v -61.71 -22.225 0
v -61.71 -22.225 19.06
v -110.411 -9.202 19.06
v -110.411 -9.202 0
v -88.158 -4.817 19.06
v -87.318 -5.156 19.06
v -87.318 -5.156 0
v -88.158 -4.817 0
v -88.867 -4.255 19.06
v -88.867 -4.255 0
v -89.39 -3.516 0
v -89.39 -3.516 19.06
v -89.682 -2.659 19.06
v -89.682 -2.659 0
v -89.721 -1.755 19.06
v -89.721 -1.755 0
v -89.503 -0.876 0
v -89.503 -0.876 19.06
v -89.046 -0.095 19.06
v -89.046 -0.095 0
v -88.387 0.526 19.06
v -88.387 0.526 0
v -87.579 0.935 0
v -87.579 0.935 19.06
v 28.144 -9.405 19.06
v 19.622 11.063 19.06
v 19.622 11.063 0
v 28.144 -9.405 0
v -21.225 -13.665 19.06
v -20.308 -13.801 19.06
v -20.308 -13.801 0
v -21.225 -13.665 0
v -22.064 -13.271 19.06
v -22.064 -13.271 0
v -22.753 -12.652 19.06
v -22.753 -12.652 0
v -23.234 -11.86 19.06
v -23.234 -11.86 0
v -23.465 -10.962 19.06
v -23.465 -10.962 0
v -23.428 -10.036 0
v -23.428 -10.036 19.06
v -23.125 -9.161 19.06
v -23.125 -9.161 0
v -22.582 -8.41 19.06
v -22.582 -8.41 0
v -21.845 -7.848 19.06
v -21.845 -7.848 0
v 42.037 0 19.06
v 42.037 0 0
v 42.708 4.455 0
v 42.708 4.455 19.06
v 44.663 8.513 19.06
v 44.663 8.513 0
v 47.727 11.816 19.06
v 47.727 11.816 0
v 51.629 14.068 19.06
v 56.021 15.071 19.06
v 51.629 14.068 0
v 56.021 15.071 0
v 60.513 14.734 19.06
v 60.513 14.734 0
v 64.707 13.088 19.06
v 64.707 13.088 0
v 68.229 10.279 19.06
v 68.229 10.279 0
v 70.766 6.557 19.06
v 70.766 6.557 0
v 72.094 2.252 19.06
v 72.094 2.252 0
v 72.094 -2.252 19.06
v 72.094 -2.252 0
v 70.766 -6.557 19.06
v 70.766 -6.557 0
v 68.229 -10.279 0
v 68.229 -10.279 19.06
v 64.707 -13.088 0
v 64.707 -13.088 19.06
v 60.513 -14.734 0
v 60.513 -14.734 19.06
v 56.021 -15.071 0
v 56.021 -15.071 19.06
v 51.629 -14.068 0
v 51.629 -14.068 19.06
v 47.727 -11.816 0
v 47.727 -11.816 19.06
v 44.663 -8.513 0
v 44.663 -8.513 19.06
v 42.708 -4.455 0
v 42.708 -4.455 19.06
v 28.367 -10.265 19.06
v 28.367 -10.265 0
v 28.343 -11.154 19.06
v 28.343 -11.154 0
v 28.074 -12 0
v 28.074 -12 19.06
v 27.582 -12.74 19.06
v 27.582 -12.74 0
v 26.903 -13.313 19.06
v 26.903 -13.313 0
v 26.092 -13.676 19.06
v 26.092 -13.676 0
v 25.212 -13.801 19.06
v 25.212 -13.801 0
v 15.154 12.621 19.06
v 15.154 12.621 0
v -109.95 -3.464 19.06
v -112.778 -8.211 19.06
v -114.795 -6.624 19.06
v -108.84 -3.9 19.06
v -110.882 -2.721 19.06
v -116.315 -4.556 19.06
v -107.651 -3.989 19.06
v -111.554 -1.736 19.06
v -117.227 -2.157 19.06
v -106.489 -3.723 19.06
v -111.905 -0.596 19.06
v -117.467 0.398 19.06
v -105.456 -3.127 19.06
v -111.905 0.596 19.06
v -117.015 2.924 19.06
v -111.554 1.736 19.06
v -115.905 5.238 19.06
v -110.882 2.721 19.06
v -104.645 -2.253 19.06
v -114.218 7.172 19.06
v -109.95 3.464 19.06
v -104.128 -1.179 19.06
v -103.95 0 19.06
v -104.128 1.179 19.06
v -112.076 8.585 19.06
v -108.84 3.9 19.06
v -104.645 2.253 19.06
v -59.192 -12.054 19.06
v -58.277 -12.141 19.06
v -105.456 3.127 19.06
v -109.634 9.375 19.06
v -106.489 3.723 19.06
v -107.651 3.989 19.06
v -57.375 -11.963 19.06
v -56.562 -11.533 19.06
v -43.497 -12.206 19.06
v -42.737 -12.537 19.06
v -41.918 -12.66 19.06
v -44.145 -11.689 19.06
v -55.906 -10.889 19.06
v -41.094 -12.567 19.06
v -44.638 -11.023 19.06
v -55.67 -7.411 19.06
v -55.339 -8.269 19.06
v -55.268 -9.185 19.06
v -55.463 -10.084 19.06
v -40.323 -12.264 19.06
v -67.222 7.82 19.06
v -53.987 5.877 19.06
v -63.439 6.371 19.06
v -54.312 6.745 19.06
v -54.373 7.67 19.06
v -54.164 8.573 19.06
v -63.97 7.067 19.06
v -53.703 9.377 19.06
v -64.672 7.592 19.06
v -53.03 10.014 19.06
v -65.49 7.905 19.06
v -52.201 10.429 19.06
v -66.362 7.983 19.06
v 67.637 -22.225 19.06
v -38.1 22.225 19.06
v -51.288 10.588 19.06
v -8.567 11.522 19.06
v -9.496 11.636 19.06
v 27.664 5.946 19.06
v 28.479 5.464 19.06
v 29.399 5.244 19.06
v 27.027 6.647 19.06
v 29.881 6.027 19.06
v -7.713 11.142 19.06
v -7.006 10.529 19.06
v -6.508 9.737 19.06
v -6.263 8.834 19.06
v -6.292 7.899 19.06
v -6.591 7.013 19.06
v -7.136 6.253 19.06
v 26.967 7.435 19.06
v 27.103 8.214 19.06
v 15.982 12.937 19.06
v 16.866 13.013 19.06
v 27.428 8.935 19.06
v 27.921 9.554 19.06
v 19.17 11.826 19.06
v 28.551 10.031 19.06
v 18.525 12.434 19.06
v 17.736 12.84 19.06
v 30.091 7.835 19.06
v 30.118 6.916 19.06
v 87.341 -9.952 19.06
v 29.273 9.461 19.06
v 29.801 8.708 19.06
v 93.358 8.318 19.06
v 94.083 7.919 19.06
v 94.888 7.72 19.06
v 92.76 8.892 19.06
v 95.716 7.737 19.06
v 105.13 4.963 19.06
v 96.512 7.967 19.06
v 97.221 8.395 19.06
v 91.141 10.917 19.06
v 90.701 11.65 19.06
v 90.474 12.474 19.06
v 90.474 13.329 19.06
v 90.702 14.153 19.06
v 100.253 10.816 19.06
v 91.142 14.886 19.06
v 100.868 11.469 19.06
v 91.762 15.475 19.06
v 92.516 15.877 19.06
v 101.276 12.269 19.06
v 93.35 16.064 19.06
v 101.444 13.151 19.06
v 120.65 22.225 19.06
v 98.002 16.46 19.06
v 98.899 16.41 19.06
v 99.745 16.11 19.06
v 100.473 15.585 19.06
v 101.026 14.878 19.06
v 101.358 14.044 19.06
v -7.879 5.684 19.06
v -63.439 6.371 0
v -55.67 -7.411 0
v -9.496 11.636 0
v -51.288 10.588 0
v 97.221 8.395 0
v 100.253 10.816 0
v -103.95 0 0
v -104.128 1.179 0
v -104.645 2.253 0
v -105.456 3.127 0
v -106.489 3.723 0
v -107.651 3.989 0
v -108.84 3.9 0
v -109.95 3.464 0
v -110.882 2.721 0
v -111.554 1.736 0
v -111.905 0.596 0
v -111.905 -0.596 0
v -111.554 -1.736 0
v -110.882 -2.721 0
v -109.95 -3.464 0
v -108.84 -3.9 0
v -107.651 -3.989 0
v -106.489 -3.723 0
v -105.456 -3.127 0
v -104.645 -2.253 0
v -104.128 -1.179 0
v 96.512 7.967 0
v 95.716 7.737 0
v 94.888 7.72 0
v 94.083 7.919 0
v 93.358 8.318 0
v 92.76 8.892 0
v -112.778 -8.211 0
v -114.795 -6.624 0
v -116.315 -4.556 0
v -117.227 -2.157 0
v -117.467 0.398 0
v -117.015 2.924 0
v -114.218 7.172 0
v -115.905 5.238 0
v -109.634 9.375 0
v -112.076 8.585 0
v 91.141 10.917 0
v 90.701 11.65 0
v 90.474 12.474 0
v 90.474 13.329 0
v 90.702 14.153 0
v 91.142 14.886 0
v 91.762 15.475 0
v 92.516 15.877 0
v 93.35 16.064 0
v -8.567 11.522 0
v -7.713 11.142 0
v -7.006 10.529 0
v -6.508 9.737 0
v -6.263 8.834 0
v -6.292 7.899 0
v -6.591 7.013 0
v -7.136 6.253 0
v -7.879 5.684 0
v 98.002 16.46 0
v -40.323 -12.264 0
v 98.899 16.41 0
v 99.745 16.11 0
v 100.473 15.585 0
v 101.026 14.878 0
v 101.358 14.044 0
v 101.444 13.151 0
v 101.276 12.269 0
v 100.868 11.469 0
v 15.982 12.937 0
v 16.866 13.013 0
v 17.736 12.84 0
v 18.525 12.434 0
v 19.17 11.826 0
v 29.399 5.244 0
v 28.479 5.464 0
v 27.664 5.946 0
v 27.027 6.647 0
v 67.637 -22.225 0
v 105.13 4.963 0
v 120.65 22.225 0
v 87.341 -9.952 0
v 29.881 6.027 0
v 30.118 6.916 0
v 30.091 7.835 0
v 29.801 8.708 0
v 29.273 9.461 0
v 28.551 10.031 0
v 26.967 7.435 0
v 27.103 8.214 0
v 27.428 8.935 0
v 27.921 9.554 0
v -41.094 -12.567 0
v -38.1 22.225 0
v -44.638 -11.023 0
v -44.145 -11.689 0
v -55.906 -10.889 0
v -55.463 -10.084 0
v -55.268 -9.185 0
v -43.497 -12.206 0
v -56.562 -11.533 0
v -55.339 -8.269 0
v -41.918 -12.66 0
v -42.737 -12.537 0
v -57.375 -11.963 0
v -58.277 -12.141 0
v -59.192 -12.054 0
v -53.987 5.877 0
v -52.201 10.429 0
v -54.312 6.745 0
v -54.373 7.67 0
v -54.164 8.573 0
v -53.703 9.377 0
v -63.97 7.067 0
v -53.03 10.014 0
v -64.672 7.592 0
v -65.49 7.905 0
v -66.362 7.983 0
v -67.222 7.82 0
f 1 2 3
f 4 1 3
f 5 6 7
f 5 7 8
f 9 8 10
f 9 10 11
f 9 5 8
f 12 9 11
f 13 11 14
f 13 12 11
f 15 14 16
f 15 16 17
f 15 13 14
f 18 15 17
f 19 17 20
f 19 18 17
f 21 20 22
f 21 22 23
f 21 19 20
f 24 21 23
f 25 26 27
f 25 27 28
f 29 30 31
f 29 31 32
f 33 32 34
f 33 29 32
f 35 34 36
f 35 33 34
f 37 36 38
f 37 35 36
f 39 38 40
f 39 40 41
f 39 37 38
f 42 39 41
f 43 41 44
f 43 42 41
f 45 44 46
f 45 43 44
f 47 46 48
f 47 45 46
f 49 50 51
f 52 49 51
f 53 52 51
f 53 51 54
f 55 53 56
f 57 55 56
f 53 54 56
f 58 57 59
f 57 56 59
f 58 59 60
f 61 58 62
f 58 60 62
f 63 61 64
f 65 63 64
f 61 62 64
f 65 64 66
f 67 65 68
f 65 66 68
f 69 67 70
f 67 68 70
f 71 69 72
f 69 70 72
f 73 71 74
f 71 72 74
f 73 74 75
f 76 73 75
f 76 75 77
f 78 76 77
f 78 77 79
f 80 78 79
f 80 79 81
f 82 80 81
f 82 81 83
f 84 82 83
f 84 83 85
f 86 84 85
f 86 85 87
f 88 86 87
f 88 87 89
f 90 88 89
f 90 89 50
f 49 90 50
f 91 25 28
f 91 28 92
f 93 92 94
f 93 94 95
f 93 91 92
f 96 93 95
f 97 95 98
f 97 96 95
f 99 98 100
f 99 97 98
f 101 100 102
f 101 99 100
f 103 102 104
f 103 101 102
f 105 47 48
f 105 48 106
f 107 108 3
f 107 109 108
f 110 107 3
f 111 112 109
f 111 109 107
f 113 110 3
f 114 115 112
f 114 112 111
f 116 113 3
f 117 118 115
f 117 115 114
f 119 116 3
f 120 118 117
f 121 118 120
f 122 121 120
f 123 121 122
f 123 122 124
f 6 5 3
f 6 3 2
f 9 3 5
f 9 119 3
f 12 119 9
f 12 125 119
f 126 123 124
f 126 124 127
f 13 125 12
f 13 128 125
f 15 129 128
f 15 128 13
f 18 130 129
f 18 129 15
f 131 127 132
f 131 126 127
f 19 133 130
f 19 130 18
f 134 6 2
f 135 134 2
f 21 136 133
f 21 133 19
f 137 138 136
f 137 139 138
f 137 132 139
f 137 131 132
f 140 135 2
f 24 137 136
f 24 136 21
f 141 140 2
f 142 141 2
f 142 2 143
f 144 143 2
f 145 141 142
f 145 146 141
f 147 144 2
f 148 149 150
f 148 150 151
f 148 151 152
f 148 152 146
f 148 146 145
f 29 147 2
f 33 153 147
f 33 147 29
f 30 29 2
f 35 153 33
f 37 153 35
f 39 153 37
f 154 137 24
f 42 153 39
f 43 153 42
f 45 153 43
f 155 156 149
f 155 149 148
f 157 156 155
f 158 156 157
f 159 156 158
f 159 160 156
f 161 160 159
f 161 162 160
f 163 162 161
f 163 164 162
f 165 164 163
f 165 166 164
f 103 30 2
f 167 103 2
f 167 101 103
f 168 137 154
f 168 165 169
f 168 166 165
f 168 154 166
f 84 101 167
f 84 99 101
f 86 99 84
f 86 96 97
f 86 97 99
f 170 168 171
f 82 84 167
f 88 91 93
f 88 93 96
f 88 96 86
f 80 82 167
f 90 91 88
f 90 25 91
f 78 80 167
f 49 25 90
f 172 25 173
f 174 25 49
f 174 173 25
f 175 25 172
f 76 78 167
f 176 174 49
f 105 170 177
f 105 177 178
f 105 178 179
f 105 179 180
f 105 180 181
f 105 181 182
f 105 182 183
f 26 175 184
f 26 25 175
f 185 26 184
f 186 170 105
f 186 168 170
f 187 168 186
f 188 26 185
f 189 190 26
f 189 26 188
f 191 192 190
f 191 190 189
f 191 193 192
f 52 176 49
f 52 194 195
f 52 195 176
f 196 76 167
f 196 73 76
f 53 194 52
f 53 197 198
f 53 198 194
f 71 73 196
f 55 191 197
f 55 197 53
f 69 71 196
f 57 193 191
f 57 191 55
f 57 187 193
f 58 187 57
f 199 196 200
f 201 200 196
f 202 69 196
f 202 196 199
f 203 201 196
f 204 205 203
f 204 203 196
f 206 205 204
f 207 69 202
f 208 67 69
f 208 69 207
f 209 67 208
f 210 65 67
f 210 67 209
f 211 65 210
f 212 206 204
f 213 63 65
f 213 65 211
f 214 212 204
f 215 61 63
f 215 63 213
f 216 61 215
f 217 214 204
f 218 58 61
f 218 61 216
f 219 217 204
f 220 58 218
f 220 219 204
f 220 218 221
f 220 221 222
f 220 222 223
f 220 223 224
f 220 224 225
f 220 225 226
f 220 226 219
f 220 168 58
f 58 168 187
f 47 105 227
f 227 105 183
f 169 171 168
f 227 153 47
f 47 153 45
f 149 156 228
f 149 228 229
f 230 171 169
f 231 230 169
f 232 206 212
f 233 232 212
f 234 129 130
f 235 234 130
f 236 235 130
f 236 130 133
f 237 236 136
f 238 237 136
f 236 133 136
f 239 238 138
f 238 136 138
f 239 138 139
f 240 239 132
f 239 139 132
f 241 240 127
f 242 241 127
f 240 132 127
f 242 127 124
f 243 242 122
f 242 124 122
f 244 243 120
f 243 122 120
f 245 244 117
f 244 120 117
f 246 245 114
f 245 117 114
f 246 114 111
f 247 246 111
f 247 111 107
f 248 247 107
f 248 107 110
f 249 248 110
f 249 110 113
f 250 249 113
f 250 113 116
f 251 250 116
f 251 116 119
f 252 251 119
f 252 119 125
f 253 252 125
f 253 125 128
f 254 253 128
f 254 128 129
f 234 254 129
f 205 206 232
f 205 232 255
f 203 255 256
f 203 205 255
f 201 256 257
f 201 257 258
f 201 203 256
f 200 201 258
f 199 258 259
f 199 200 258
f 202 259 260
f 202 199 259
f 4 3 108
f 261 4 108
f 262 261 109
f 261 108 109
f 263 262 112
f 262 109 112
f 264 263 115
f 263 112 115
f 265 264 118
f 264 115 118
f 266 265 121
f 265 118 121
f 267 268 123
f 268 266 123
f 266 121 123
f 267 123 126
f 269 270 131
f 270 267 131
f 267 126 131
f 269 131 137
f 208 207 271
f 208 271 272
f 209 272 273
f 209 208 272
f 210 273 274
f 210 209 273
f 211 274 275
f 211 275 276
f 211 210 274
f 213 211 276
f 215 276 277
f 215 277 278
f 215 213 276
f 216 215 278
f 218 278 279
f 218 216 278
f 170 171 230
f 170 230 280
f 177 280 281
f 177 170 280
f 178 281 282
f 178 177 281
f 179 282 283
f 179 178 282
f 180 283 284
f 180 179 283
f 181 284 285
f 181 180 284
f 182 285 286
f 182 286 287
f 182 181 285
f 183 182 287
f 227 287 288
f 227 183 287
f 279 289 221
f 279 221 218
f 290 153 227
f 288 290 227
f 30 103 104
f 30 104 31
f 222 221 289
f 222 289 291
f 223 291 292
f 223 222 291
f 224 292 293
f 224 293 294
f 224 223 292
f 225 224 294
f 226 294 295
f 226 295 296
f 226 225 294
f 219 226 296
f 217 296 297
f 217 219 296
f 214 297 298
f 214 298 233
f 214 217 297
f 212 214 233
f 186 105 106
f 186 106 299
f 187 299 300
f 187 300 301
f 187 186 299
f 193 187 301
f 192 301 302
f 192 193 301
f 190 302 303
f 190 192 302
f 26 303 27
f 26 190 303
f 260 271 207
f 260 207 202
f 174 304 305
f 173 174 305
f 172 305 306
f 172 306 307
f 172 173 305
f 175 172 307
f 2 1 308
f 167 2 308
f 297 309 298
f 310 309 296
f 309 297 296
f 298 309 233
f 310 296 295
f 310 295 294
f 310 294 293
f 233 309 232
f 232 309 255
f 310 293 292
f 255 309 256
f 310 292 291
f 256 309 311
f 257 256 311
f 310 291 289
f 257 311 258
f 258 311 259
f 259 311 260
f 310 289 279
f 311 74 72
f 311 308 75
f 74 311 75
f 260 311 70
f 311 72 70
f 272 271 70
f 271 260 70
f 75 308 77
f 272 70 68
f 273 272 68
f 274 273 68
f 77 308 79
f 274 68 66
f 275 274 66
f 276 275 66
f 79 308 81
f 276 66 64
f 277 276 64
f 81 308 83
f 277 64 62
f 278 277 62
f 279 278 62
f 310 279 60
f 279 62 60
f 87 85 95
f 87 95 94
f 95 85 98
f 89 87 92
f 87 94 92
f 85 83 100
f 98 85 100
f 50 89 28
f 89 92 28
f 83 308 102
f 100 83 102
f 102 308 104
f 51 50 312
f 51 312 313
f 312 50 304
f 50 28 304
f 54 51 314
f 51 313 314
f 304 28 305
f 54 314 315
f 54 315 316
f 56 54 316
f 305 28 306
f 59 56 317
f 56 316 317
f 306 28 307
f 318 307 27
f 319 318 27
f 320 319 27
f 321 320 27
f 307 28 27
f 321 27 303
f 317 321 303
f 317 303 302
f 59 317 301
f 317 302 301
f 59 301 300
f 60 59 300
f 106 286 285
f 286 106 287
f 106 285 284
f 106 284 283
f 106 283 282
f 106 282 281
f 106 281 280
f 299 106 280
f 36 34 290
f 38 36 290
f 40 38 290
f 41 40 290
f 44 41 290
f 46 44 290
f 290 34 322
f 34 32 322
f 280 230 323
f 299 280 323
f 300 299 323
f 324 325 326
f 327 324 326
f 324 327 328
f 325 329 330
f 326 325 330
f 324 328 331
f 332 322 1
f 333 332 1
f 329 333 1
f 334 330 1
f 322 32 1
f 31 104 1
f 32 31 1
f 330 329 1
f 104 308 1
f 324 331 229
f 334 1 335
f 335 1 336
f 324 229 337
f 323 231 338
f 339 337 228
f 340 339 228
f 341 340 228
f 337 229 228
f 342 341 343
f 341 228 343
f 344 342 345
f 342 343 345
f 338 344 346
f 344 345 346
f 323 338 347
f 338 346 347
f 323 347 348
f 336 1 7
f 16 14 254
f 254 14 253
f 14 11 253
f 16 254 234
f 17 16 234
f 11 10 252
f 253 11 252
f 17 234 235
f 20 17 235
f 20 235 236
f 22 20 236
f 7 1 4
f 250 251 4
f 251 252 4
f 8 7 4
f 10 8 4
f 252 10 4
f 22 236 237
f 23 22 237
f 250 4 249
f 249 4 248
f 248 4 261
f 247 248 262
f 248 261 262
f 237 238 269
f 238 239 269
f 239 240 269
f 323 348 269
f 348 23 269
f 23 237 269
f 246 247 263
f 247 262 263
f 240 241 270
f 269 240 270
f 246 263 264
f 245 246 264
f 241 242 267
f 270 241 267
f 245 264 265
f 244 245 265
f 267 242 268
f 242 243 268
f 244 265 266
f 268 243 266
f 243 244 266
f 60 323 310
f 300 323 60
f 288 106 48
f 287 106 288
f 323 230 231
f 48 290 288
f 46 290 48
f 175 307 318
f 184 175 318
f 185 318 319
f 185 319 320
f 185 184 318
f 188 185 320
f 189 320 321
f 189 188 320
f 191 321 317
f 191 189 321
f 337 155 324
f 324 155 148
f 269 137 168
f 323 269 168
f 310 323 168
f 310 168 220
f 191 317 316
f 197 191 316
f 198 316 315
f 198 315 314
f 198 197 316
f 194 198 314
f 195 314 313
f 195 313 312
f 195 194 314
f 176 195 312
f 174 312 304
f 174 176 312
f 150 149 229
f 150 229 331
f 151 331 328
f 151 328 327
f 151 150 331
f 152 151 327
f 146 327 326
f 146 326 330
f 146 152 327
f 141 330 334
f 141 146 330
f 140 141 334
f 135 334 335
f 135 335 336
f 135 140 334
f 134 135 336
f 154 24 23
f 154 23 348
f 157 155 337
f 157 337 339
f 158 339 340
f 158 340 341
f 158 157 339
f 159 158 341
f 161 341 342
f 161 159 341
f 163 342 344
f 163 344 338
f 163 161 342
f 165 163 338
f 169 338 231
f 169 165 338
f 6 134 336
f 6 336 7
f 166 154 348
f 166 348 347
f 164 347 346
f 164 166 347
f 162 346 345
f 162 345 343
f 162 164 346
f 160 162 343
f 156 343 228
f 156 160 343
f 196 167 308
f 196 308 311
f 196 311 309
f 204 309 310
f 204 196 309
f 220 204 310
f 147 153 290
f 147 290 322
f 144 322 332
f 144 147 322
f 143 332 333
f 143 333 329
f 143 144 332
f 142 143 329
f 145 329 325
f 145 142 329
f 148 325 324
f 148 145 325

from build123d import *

# Parameters (mm, degrees)
SKETCH1_W           = 241.3
SKETCH1_H           = 44.45
BOSS_EXTRUDE1_DEPTH = 19.06
SKETCH3_R           = 4
CUT_EXTRUDE1_DEPTH  = 125.151748779
CUT_EXTRUDE2_DEPTH  = 125.151748779
SKETCH11_R          = 15.113
CUT_EXTRUDE3_DEPTH  = 125.151748779
CUT_EXTRUDE5_DEPTH  = 125.151748779
FILLET1_R           = 3.175


with BuildPart() as part:
    # Sketch1 → Boss-Extrude1 (new body)
    with BuildSketch(Plane.XY):
        Rectangle(SKETCH1_W, SKETCH1_H)
    extrude(amount=BOSS_EXTRUDE1_DEPTH)

    # Sketch3 → Cut-Extrude1 (cut, through all)
    with BuildSketch(Plane.XY.offset(19.06)):
        with Locations((-107.95, 0)):
            Circle(SKETCH3_R)
    extrude(amount=-CUT_EXTRUDE1_DEPTH, mode=Mode.SUBTRACT)

    # Sketch5 → Cut-Extrude2 (cut, through all)
    with BuildSketch(Plane.XY.offset(19.06)):
        with BuildLine():
            ThreePointArc((67.637087091, -22.225), (96.497916739, -2.807923084), (120.65, 22.225))
            Line((120.65, 22.225), (120.65, -22.225))
            Line((120.65, -22.225), (67.637087091, -22.225))
        make_face()
        with BuildLine():
            Line((-61.710210997, -22.225), (-110.410681995, -9.201666649))
            ThreePointArc((-110.410681995, -9.201666649), (-117.466687359, 0.397852617), (-109.634072253, 9.374941368))
            Line((-109.634072253, 9.374941368), (-38.1, 22.225))
            Line((-38.1, 22.225), (-120.65, 22.225))
            Line((-120.65, 22.225), (-120.65, -22.225))
            Line((-120.65, -22.225), (-61.710210997, -22.225))
        make_face()
    extrude(amount=-CUT_EXTRUDE2_DEPTH, mode=Mode.SUBTRACT)

    # Sketch11 → Cut-Extrude3 (cut, through all)
    with BuildSketch(Plane(origin=(0, 0, 0), x_dir=(-1, 0, 0), z_dir=(0, 0, -1))):
        with Locations((-57.15, 0)):
            Circle(SKETCH11_R)
    extrude(amount=-CUT_EXTRUDE3_DEPTH, mode=Mode.SUBTRACT)

    # Sketch14 → Cut-Extrude5 (cut, through all)
    with BuildSketch(Plane.XY.offset(19.06)):
        Polygon((87.427282936, 15.558708401), (94.741989073, 6.41532573), (108.43714596, 17.350301349), align=None)
        Polygon((18.258483502, 14.338005817), (29.973493873, -13.800738505), (-32.606529101, -13.800738505), align=None)
        Polygon((-43.100879601, -13.800738505), (3.468328331, 11.961548148), (-56.519992491, 10.456326363), align=None)
        Polygon((-64.730780564, 8.662121496), (-52.068091334, -13.800738505), (-97.910045601, -2.558530136), align=None)
        Polygon((25.377220315, 10.456326363), (27.958556135, 4.256114298), (42.851089432, 10.456326363), align=None)
    extrude(amount=-CUT_EXTRUDE5_DEPTH, mode=Mode.SUBTRACT)

    # Fillet1
    # the kernel refuses this fillet: 3.175 mm, written as the material it adds along each edge
    with BuildSketch(Plane(origin=(-64.730780564, 8.662121496, 19.06), x_dir=(-0.9472961687281491, -0.32035912459764615, 0), z_dir=(0, 0, -1))) as fillet1_piece_1:
        with BuildLine():
            CenterArc((FILLET1_R * 0.828359701977, -FILLET1_R), FILLET1_R, 90, 79.273962625)
            Line((-FILLET1_R * 0.154168619156, -FILLET1_R * 0.813886867277), (0, 0))
            Line((0, 0), (FILLET1_R * 0.828359701977, 0))
        make_face()
    extrude(amount=19.06)
    with BuildSketch(Plane(origin=(-52.068091334, -13.800738505, 19.06), x_dir=(-0.9712208651423397, 0.23818066905642277, 0), z_dir=(0, 0, -1))) as fillet1_piece_2:
        with BuildLine():
            CenterArc((FILLET1_R * 2.310303232, FILLET1_R), FILLET1_R, 136.810131201, 133.189868799)
            Line((FILLET1_R * 1.58121357242, FILLET1_R * 1.68441819694), (0, 0))
            Line((0, 0), (FILLET1_R * 2.310303232, 0))
        make_face()
    extrude(amount=19.06)
    with BuildSketch(Plane(origin=(-97.910045601, -2.558530136, 19.06), x_dir=(0.9472961687281494, 0.32035912459764504, 0), z_dir=(0, 0, -1))) as fillet1_piece_3:
        with BuildLine():
            CenterArc((FILLET1_R * 3.43487976267, FILLET1_R), FILLET1_R, 122.463831423, 147.536168577)
            Line((FILLET1_R * 2.89811266126, FILLET1_R * 1.8437304539), (0, 0))
            Line((0, 0), (FILLET1_R * 3.43487976267, 0))
        make_face()
    extrude(amount=19.06)
    with BuildSketch(Plane(origin=(-56.519992491, 10.456326363, 19.06), x_dir=(0.9996853464994547, 0.025084018702456384, 0), z_dir=(0, 0, -1))) as fillet1_piece_4:
        with BuildLine():
            CenterArc((FILLET1_R * 1.64840949376, FILLET1_R), FILLET1_R, 152.485801408, 117.514198592)
            Line((FILLET1_R * 0.761513114746, FILLET1_R * 1.46196841114), (0, 0))
            Line((0, 0), (FILLET1_R * 1.64840949376, 0))
        make_face()
    extrude(amount=19.06)
    with BuildSketch(Plane(origin=(3.468328331, 11.961548148, 19.06), x_dir=(-0.8750292896969416, -0.48406997652453715, 0), z_dir=(0, 0, -1))) as fillet1_piece_5:
        with BuildLine():
            CenterArc((FILLET1_R * 4.08447056876, FILLET1_R), FILLET1_R, 117.514198592, 152.485801408)
            Line((FILLET1_R * 3.62250215761, FILLET1_R * 1.88689637901), (0, 0))
            Line((0, 0), (FILLET1_R * 4.08447056876, 0))
        make_face()
    extrude(amount=19.06)
    with BuildSketch(Plane(origin=(-43.100879601, -13.800738505, 19.06), x_dir=(0.8750292896969416, 0.48406997652453704, 0), z_dir=(0, 0, -1))) as fillet1_piece_6:
        with BuildLine():
            CenterArc((FILLET1_R, -FILLET1_R), FILLET1_R, 90, 90)
            Line((0, -FILLET1_R), (0, 0))
            Line((0, 0), (FILLET1_R, 0))
        make_face()
    extrude(amount=19.06)
    with BuildSketch(Plane(origin=(-32.606529101, -13.800738505, 19.06), x_dir=(0.8750292896969417, 0.48406997652453687, 0), z_dir=(0, 0, -1))) as fillet1_piece_7:
        with BuildLine():
            CenterArc((FILLET1_R * 3.87346743369, FILLET1_R), FILLET1_R, 118.951557757, 151.048442243)
            Line((FILLET1_R * 3.38939745717, FILLET1_R * 1.8750292897), (0, 0))
            Line((0, 0), (FILLET1_R * 3.87346743369, 0))
        make_face()
    extrude(amount=19.06)
    with BuildSketch(Plane(origin=(18.258483502, 14.338005817, 19.06), x_dir=(-0.8750292896969422, -0.4840699765245361, 0), z_dir=(0, 0, -1))) as fillet1_piece_8:
        with BuildLine():
            CenterArc((FILLET1_R * 1.11742055595, -FILLET1_R), FILLET1_R, 90, 96.348118808)
            Line((FILLET1_R * 0.123552109362, -FILLET1_R * 1.11056903214), (0, 0))
            Line((0, 0), (FILLET1_R * 1.11742055595, 0))
        make_face()
    extrude(amount=19.06)
    with BuildSketch(Plane(origin=(29.973493873, -13.800738505, 19.06), x_dir=(-1, 0, 0), z_dir=(0, 0, -1))) as fillet1_piece_9:
        with BuildLine():
            CenterArc((FILLET1_R * 1.49953423253, FILLET1_R), FILLET1_R, 157.396561051, 112.603438949)
            Line((FILLET1_R * 0.576347082868, FILLET1_R * 1.38435073396), (0, 0))
            Line((0, 0), (FILLET1_R * 1.49953423253, 0))
        make_face()
    extrude(amount=19.06)
    with BuildSketch(Plane(origin=(87.427282936, 15.558708401, 19.06), x_dir=(0.6246950475544248, -0.7808688094430298, 0), z_dir=(0, 0, -1))) as fillet1_piece_10:
        with BuildLine():
            CenterArc((FILLET1_R * 1.87227376636, -FILLET1_R), FILLET1_R, 90, 123.785764981)
            Line((FILLET1_R * 1.04115111223, -FILLET1_R * 1.55608914195), (0, 0))
            Line((0, 0), (FILLET1_R * 1.87227376636, 0))
        make_face()
    extrude(amount=19.06)
    with BuildSketch(Plane(origin=(108.43714596, 17.350301349, 19.06), x_dir=(-0.7814571605260681, -0.6239588978951538, 0), z_dir=(0, 0, -1))) as fillet1_piece_11:
        with BuildLine():
            CenterArc((FILLET1_R * 3.2984470476, FILLET1_R), FILLET1_R, 123.731770788, 146.268229212)
            Line((FILLET1_R * 2.74314138288, FILLET1_R * 1.83164633032), (0, 0))
            Line((0, 0), (FILLET1_R * 3.2984470476, 0))
        make_face()
    extrude(amount=19.06)
    with BuildSketch(Plane(origin=(94.741989073, 6.41532573, 19.06), x_dir=(-0.6246950475544234, 0.7808688094430309, 0), z_dir=(0, 0, -1))) as fillet1_piece_12:
        with BuildLine():
            CenterArc((FILLET1_R * 0.999058067303, FILLET1_R), FILLET1_R, 180.053994194, 89.946005806)
            Line((-FILLET1_R * 0.000941488660736, FILLET1_R * 0.999057623684), (0, 0))
            Line((0, 0), (FILLET1_R * 0.999058067303, 0))
        make_face()
    extrude(amount=19.06)
    with BuildSketch(Plane(origin=(27.958556135, 4.256114298, 19.06), x_dir=(-0.3843507339571626, 0.9231871496650018, 0), z_dir=(0, 0, -1))) as fillet1_piece_13:
        with BuildLine():
            CenterArc((FILLET1_R, FILLET1_R), FILLET1_R, 180, 90)
            Line((0, FILLET1_R), (0, 0))
            Line((0, 0), (FILLET1_R, 0))
        make_face()
    extrude(amount=19.06)
    with BuildSketch(Plane(origin=(42.851089432, 10.456326363, 19.06), x_dir=(-0.9231871496650015, -0.3843507339571632, 0), z_dir=(0, 0, -1))) as fillet1_piece_14:
        with BuildLine():
            CenterArc((FILLET1_R * 5.003729614, FILLET1_R), FILLET1_R, 112.603438949, 157.396561051)
            Line((FILLET1_R * 4.61937888005, FILLET1_R * 1.92318714967), (0, 0))
            Line((0, 0), (FILLET1_R * 5.003729614, 0))
        make_face()
    extrude(amount=19.06)
    with BuildSketch(Plane(origin=(25.377220315, 10.456326363, 19.06), x_dir=(0.3843507339571629, -0.9231871496650017, 0), z_dir=(0, 0, -1))) as fillet1_piece_15:
        with BuildLine():
            CenterArc((FILLET1_R * 1.49953423253, -FILLET1_R), FILLET1_R, 90, 112.603438949)
            Line((FILLET1_R * 0.576347082868, -FILLET1_R * 1.38435073396), (0, 0))
            Line((0, 0), (FILLET1_R * 1.49953423253, 0))
        make_face()
    extrude(amount=19.06)


solid = part.part
